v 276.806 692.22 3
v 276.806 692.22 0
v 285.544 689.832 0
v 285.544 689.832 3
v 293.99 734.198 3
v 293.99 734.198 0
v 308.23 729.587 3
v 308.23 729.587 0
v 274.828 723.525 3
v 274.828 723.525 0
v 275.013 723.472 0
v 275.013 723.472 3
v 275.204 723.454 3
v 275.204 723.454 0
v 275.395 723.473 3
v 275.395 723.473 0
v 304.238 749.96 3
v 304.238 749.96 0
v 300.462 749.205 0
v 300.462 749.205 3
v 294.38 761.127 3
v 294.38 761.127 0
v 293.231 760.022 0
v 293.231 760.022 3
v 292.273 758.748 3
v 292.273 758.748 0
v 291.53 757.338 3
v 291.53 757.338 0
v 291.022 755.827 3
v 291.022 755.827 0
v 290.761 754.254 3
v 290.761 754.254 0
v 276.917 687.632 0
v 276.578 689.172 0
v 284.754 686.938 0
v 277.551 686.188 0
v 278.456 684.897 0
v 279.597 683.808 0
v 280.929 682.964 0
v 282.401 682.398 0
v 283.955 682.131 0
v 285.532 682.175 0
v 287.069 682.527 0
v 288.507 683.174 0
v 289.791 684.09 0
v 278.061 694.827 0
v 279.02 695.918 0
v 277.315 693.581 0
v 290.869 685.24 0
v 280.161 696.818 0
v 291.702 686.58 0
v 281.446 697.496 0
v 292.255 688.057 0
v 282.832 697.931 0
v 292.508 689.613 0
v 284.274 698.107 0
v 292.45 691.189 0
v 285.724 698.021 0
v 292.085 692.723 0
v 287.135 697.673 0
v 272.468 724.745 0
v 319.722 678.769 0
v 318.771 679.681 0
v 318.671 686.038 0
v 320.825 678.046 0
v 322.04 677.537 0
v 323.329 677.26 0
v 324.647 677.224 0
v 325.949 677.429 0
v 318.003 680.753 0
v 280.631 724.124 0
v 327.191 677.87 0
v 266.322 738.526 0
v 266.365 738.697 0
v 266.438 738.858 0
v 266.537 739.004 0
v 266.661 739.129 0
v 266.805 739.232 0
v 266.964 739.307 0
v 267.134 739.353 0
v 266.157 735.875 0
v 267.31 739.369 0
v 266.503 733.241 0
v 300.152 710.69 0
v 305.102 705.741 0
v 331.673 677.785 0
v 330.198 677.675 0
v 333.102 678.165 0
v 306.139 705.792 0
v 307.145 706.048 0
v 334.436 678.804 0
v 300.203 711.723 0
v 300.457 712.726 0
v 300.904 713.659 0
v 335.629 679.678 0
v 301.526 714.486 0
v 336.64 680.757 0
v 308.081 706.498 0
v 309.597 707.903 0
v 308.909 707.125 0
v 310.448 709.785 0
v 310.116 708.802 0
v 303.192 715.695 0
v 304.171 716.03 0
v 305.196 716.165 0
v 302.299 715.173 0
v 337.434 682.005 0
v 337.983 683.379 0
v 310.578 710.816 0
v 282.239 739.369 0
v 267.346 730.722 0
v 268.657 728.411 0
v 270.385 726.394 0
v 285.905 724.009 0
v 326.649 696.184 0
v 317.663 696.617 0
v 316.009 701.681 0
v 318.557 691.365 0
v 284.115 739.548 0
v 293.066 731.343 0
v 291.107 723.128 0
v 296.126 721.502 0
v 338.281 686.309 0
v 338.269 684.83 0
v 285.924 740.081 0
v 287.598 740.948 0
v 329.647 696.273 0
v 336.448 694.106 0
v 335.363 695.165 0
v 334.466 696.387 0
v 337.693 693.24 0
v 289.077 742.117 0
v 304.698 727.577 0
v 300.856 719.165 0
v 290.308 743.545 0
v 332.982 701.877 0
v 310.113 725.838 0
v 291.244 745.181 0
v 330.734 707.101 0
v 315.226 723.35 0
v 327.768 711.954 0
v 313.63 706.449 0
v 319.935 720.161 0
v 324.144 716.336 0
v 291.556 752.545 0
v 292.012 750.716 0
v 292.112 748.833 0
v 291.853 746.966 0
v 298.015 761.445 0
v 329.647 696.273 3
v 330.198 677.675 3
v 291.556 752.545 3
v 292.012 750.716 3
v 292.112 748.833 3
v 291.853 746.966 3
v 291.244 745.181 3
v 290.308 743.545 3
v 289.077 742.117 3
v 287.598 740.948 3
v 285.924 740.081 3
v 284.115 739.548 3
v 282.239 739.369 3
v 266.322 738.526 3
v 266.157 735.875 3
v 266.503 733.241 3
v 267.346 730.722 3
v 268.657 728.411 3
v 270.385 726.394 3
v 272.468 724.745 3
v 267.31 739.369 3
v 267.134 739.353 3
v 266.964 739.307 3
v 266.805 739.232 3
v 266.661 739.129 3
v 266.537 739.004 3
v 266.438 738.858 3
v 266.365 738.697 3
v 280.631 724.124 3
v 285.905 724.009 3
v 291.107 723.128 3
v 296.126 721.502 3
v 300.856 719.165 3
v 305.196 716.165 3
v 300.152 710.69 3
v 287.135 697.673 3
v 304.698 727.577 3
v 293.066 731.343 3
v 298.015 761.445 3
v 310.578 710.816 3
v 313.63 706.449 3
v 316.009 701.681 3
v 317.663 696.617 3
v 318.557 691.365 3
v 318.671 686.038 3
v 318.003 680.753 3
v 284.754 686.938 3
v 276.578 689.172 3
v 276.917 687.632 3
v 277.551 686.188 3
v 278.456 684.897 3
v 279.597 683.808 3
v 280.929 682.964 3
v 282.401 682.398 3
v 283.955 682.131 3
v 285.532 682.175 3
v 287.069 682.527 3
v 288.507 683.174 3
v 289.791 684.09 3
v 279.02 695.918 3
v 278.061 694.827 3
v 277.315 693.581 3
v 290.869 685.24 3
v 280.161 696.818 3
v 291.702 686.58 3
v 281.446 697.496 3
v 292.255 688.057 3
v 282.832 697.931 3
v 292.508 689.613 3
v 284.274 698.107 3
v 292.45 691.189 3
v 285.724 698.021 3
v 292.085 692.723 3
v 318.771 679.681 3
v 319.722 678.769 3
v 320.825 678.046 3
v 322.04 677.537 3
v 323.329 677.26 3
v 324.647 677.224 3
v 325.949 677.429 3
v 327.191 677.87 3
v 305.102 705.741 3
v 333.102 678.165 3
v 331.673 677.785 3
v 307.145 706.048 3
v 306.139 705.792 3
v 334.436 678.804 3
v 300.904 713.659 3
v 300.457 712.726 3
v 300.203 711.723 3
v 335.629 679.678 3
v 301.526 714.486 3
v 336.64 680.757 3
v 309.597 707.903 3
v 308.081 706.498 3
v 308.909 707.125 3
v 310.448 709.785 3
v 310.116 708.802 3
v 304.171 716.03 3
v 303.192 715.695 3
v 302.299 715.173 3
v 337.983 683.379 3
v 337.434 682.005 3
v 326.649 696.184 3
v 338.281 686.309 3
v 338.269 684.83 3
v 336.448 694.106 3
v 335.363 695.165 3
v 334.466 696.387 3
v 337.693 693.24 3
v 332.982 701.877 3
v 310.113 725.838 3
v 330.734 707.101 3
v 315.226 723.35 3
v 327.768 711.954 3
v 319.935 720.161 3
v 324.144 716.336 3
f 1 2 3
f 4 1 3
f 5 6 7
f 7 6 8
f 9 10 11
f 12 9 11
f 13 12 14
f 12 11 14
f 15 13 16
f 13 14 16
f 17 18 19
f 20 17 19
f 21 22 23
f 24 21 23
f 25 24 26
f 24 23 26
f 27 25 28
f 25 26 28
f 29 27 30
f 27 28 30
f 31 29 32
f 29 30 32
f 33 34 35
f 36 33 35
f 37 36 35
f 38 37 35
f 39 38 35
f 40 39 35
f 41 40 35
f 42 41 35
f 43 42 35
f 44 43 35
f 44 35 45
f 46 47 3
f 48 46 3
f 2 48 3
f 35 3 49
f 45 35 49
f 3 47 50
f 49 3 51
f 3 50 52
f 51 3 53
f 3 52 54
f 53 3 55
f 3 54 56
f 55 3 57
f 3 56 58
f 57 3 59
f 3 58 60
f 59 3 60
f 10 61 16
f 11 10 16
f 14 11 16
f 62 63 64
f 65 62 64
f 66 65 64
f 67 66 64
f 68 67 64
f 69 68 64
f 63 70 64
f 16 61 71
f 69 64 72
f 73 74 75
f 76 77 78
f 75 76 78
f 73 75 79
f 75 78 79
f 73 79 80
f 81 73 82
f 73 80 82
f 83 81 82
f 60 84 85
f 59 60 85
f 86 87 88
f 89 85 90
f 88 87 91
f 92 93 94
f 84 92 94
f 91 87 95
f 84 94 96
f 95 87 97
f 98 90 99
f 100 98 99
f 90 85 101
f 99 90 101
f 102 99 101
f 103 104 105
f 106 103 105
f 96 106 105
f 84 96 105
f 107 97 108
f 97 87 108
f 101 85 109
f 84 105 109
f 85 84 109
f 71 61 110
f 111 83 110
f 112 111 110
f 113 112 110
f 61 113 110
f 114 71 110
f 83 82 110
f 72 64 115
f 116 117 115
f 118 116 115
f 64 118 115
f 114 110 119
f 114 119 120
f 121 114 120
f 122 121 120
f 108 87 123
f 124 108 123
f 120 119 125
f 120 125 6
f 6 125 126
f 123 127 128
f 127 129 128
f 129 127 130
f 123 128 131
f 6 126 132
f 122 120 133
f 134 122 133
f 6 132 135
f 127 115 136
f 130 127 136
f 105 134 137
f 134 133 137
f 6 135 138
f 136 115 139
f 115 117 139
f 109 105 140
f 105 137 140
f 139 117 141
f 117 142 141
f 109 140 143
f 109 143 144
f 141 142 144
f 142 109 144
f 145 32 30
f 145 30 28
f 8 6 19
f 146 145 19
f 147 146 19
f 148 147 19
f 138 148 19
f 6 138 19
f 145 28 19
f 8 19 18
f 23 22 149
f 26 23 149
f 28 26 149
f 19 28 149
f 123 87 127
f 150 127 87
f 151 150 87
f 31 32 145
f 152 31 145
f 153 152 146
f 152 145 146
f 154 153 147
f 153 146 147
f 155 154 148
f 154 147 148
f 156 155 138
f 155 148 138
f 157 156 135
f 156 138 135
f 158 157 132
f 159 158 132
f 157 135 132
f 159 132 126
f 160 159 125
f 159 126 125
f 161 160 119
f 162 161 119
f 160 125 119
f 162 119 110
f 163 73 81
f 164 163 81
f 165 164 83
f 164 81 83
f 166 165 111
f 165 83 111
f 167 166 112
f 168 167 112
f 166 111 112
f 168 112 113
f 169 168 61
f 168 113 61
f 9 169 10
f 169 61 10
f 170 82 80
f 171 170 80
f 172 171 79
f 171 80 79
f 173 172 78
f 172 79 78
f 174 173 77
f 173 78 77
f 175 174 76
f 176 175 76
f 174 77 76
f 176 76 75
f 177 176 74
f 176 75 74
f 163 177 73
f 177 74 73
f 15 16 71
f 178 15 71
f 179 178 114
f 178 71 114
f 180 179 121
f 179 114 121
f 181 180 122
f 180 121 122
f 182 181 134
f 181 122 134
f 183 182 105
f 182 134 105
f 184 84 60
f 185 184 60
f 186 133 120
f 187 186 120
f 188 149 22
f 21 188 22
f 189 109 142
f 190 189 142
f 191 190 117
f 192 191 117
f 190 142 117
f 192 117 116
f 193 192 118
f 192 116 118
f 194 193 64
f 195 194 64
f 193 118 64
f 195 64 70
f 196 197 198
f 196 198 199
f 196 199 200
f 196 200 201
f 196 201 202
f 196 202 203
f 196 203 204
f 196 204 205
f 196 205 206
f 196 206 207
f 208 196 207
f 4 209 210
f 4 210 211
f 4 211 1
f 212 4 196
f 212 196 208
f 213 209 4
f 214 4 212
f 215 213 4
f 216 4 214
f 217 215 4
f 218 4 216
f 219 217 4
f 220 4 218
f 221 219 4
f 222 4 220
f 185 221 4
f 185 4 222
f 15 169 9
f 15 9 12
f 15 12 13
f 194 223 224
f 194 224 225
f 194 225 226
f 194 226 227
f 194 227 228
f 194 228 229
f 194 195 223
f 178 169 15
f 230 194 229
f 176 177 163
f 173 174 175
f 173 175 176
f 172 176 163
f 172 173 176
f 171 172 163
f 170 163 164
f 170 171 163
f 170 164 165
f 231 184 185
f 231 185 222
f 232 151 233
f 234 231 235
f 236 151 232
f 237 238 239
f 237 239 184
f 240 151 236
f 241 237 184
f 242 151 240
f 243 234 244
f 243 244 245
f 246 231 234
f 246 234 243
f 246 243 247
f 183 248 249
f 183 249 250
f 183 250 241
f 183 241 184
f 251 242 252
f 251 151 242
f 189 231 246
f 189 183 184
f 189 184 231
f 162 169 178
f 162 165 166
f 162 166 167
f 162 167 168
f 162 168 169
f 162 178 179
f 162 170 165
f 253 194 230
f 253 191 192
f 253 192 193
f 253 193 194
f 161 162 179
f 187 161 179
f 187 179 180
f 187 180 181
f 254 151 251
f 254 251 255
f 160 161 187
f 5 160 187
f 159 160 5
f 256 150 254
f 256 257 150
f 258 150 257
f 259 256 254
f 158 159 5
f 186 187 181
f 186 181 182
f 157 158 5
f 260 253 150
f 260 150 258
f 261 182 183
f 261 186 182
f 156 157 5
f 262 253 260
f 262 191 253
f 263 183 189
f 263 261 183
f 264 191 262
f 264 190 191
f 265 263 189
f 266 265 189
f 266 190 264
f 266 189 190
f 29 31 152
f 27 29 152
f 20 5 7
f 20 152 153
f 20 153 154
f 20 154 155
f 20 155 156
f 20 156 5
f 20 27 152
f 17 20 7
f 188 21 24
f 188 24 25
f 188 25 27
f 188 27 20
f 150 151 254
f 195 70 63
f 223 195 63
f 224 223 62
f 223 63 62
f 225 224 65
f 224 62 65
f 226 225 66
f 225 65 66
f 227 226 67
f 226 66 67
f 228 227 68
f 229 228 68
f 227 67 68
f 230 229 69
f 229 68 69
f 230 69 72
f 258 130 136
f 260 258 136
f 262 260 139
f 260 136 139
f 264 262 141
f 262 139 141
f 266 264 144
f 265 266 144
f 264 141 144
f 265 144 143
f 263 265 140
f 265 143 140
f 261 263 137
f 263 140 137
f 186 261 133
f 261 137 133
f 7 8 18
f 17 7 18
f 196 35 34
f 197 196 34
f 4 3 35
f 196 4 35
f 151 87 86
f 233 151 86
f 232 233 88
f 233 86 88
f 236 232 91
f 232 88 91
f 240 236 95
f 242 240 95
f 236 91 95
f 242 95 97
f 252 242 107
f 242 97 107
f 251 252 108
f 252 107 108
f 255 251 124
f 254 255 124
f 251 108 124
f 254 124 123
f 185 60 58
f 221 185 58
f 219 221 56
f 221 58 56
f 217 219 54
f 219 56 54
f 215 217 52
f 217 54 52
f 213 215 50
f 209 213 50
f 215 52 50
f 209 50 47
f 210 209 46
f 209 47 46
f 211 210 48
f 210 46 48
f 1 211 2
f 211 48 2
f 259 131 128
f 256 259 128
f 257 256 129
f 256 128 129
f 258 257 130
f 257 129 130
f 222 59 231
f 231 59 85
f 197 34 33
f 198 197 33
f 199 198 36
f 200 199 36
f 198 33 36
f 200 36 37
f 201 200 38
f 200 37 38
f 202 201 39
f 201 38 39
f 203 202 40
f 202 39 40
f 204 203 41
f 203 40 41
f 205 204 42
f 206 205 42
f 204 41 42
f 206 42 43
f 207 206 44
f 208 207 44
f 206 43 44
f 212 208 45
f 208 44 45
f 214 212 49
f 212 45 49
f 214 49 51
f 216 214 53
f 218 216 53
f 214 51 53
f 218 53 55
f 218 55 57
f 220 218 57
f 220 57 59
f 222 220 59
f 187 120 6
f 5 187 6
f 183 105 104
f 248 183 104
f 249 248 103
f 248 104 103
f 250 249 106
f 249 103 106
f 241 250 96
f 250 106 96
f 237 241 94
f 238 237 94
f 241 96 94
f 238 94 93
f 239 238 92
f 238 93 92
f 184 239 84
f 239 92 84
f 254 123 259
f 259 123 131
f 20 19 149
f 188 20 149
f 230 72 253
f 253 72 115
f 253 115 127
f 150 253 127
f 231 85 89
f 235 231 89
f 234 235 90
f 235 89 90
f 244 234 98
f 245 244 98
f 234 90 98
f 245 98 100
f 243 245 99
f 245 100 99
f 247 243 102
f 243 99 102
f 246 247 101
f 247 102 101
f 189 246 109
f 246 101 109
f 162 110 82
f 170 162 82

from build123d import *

# Parameters (mm, degrees)
BASE_EXTRUDE_DEPTH = 3


with BuildPart() as part:
    # Sketch1 → Base-Extrude (new body)
    with BuildSketch(Plane.XY):
        with BuildLine():
            Line((293.989820862, 734.197583092), (308.230093844, 729.586709902))
            Line((308.230093844, 729.586709902), (304.237578804, 749.960041406))
            Line((304.237578804, 749.960041406), (300.46187699, 749.205127022))
            Line((300.46187699, 749.205127022), (298.014696403, 761.444692703))
            Line((298.014696403, 761.444692703), (294.380010045, 761.126528526))
            ThreePointArc((294.380010045, 761.126528526), (291.873265467, 758.05762637), (290.76086587, 754.254404584))
            ThreePointArc((290.76086587, 754.254404584), (290.815065416, 744.34095117), (282.238682163, 739.368512483))
            Line((282.238682163, 739.368512483), (267.309755895, 739.368512483))
            ThreePointArc((267.309755895, 739.368512483), (266.660852695, 739.129383455), (266.322292677, 738.526361756))
            ThreePointArc((266.322292677, 738.526361756), (267.945922187, 729.535060668), (274.828113717, 723.525476008))
            ThreePointArc((274.828113717, 723.525476008), (275.107735881, 723.458131465), (275.394960471, 723.473160687))
            ThreePointArc((275.394960471, 723.473160687), (291.10707298, 723.128304911), (305.196249522, 716.165223024))
            ThreePointArc((305.196249522, 716.165223024), (301.525955586, 714.485747009), (300.152427977, 710.690339367))
            Line((300.152427977, 710.690339367), (287.135003329, 697.672914719))
            ThreePointArc((287.135003329, 697.672914719), (280.788235339, 697.185935894), (276.80604128, 692.2199775))
            Line((276.80604128, 692.2199775), (285.544339655, 689.832249216))
            Line((285.544339655, 689.832249216), (284.7535812, 686.938339057))
            Line((284.7535812, 686.938339057), (276.578441435, 689.172182037))
            ThreePointArc((276.578441435, 689.172182037), (286.308923255, 682.31315648), (292.084750798, 692.72316725))
            Line((292.084750798, 692.72316725), (305.102175446, 705.740591898))
            ThreePointArc((305.102175446, 705.740591898), (308.909028424, 707.124695347), (310.57796115, 710.815567264))
            ThreePointArc((310.57796115, 710.815567264), (317.662772954, 696.617074851), (318.003459515, 680.752785464))
            ThreePointArc((318.003459515, 680.752785464), (322.040475508, 677.537424223), (327.190781226, 677.869684733))
            Line((327.190781226, 677.869684733), (326.648810255, 696.184005937))
            Line((326.648810255, 696.184005937), (329.647496764, 696.272745292))
            Line((329.647496764, 696.272745292), (330.19785257, 677.675083141))
            ThreePointArc((330.19785257, 677.675083141), (336.159788883, 680.193967384), (338.280950791, 686.308714689))
            Line((338.280950791, 686.308714689), (337.692715429, 693.239584422))
            ThreePointArc((337.692715429, 693.239584422), (335.883457798, 694.612751583), (334.465786033, 696.387352382))
            ThreePointArc((334.465786033, 696.387352382), (324.143791375, 716.336225522), (304.697858302, 727.577079591))
            Line((304.697858302, 727.577079591), (293.065685578, 731.343473215))
            Line((293.065685578, 731.343473215), (293.989820862, 734.197583092))
        make_face()
    extrude(amount=BASE_EXTRUDE_DEPTH)


solid = part.part
